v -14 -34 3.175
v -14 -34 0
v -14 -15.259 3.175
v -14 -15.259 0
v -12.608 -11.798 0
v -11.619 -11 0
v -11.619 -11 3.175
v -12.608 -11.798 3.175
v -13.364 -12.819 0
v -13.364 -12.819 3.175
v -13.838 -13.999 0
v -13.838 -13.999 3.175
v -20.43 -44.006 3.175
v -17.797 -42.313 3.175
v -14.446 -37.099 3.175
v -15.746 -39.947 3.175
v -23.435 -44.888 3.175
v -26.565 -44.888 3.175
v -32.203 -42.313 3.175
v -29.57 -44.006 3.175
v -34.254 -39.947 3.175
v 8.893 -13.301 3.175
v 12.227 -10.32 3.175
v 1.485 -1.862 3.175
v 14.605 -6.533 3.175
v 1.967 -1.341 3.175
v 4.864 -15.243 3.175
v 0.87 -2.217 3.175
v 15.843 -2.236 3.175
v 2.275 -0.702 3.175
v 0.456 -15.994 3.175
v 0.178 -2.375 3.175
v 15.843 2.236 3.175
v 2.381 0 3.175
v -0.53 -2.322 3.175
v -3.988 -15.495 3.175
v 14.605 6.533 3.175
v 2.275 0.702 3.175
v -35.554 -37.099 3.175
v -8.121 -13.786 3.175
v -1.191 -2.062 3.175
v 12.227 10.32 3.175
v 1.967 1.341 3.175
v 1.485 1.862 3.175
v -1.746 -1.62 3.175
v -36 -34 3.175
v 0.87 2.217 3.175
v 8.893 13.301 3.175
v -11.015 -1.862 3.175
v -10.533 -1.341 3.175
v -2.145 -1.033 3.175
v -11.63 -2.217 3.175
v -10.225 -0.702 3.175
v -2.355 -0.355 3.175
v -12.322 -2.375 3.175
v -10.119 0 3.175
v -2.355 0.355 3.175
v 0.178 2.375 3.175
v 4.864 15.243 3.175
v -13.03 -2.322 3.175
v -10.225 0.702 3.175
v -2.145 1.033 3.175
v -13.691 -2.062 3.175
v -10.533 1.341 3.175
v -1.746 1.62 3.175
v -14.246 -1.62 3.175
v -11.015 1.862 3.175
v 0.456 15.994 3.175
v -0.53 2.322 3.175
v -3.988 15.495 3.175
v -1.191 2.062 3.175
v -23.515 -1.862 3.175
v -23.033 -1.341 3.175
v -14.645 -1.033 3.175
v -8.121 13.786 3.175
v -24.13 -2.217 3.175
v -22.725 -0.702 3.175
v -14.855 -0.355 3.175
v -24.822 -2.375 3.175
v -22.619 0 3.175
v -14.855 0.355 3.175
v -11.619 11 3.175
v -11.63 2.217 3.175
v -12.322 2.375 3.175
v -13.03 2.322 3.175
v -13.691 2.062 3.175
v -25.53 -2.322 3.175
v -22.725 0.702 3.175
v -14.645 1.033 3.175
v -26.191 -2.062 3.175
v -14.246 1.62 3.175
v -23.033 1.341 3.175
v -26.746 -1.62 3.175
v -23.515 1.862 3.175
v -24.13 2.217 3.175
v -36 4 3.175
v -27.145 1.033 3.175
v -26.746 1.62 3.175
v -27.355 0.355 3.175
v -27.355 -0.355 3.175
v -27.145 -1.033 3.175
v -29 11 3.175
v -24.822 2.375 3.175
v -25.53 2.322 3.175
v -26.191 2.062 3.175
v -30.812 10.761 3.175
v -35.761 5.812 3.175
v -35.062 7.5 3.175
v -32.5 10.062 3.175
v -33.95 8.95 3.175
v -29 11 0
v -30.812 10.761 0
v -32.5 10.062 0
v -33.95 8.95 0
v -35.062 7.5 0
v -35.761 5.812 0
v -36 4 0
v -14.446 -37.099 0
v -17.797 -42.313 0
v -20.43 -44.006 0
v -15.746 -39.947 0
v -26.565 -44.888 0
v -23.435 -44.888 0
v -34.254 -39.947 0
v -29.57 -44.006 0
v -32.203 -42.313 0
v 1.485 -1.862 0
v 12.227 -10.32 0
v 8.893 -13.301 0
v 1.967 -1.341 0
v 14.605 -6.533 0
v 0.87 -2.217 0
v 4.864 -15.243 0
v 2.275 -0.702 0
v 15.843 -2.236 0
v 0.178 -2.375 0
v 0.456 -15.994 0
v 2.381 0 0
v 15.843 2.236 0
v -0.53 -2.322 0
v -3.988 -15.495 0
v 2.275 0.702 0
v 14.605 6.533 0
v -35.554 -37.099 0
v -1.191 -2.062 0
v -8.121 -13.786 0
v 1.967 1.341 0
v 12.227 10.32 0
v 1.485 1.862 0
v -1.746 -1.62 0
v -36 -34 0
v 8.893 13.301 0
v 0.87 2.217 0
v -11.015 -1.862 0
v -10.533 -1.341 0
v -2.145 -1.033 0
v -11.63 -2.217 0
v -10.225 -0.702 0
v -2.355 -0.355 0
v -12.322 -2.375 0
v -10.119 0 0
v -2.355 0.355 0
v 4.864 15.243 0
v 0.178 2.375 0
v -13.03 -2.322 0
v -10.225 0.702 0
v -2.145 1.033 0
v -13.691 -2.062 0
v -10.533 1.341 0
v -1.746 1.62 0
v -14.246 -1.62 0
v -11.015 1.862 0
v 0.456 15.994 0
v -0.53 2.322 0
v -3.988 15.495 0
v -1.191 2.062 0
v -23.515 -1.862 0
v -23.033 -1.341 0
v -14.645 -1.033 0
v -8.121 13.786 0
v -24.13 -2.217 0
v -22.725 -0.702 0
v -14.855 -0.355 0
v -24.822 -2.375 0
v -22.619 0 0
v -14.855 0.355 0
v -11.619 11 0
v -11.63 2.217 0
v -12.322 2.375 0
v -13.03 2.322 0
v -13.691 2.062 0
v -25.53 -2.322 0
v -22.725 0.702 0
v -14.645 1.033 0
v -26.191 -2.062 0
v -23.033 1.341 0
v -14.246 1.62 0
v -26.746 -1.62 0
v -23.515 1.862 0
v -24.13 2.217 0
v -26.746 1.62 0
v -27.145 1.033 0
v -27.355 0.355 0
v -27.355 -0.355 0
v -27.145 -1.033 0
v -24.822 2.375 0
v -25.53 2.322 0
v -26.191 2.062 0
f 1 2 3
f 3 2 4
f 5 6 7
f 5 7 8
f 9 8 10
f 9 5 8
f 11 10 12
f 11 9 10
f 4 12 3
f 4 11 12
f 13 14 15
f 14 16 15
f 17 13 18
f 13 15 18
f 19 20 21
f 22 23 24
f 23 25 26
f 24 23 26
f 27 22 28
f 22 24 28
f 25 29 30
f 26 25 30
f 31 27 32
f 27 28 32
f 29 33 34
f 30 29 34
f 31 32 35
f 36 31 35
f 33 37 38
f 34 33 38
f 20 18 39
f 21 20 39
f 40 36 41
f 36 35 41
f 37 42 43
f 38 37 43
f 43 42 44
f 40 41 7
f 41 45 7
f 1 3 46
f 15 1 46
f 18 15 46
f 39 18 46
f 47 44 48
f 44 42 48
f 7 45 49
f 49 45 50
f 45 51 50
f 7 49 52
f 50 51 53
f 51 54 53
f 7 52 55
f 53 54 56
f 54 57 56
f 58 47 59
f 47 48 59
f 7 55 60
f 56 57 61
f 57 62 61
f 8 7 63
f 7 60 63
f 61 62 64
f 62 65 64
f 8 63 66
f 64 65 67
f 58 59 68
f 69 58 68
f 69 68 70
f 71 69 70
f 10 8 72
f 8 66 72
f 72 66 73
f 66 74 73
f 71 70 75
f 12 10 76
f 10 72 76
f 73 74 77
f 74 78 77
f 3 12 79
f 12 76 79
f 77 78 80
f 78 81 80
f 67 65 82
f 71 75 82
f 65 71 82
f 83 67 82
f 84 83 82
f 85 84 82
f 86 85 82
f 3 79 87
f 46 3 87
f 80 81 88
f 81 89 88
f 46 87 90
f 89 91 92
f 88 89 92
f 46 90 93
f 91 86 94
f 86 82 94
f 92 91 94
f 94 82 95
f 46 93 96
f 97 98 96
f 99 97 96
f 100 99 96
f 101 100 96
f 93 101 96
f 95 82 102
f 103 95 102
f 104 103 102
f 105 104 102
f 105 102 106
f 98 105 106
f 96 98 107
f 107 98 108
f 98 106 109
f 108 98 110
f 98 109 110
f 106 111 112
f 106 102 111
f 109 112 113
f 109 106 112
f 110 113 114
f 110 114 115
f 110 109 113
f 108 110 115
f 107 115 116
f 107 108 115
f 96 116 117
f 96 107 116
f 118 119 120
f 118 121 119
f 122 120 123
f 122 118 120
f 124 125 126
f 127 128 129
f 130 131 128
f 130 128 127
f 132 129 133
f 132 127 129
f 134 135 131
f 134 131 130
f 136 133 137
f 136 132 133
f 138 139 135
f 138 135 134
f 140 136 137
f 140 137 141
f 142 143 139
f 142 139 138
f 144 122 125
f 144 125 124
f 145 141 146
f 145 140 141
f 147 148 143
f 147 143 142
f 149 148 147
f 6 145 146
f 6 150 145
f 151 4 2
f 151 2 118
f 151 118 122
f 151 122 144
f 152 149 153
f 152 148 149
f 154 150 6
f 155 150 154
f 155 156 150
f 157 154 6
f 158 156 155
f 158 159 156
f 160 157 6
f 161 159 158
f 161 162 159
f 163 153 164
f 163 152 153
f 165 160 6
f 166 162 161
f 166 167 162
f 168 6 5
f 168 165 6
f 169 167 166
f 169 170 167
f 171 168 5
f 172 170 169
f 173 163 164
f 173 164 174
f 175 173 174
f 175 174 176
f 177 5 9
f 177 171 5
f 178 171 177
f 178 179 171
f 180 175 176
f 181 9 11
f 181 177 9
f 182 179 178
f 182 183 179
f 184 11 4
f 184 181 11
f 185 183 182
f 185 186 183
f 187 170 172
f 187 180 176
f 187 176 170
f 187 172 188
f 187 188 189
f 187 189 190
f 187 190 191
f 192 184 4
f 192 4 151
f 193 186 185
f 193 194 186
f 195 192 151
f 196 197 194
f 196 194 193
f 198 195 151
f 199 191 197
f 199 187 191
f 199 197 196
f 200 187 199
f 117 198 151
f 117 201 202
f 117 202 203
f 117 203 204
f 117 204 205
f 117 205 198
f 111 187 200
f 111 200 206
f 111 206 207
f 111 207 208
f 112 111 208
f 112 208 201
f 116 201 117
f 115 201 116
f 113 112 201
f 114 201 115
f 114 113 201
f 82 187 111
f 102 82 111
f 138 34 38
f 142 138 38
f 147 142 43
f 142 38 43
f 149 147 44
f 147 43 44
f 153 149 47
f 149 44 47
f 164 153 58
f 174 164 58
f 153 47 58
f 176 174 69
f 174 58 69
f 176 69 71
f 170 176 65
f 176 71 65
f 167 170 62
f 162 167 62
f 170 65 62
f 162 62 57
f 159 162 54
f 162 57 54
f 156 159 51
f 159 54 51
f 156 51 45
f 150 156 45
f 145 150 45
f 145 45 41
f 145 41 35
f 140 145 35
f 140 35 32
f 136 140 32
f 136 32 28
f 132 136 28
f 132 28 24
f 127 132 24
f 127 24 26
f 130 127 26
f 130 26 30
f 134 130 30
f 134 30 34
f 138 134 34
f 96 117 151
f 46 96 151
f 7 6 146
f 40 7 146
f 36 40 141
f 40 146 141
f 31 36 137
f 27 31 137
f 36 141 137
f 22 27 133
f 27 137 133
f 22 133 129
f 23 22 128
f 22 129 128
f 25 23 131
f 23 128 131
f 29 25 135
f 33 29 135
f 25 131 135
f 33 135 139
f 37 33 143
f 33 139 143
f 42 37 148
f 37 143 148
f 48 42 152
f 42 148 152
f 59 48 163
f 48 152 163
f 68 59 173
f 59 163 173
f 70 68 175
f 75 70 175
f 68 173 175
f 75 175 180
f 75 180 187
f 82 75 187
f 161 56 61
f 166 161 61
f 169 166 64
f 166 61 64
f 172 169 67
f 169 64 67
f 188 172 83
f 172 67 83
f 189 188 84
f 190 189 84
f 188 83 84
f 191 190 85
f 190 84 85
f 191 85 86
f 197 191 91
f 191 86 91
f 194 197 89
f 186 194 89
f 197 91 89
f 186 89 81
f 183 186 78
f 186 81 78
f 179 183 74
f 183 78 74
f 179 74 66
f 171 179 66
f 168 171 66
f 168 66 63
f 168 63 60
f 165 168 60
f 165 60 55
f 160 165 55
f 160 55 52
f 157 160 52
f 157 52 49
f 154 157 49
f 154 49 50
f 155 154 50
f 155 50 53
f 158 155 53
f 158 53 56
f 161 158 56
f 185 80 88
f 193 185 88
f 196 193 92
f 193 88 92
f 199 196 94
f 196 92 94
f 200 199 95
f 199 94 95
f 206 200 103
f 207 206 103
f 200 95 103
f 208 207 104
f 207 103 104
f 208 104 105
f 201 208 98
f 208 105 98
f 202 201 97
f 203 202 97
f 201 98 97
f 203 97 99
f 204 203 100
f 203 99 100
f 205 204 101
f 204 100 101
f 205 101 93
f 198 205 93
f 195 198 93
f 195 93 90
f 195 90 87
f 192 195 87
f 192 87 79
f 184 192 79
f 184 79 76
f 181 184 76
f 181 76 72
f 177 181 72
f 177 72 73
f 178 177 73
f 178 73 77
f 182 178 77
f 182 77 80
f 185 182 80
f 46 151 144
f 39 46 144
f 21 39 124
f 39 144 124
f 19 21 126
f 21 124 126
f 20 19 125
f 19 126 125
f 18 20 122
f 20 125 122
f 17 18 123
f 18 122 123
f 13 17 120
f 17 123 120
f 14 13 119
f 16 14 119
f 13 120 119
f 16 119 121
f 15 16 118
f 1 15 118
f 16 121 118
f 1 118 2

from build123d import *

# Parameters (mm, degrees)
BOSS_EXTRUDE1_DEPTH = 3.175
FILLET1_R           = 7
FILLET2_R           = 5
SKETCH2_R           = 2.38125
CUT_EXTRUDE1_DEPTH  = 58.715514595
LPATTERN1_COUNT     = 3
LPATTERN1_PITCH     = 12.5


with BuildPart() as part:
    # Sketch1 → Boss-Extrude1 (new body)
    with BuildSketch(Plane.XY):
        with BuildLine():
            Line((-11.618950039, 11), (-36, 11))
            Line((-36, 11), (-36, -34))
            ThreePointArc((-36, -34), (-25, -45), (-14, -34))
            Line((-14, -34), (-14, -11))
            Line((-14, -11), (-11.618950039, -11))
            ThreePointArc((-11.618950039, -11), (16, 0), (-11.618950039, 11))
        make_face()
    extrude(amount=BOSS_EXTRUDE1_DEPTH)

    # Fillet1
    fillet1_edges = [part.edges().sort_by_distance(p)[0] for p in [
        (-36, 11, 1.5875),
    ]]
    fillet(fillet1_edges, radius=FILLET1_R)

    # Fillet2
    # the kernel refuses this fillet: 5 mm, written as the material it adds along each edge
    with BuildSketch(Plane(origin=(-14, -11, 0), x_dir=(1, 0, 0), z_dir=(0, 0, 1))) as fillet2_piece_1:
        with BuildLine():
            CenterArc((5, -4.259237102), FILLET2_R, 121.586822832, 58.413177168)
            Line((0, -4.259237102), (-0.1, -4.259237102))
            Line((-0.1, -4.259237102), (-0.1, 0))
            Line((-0.1, 0), (0, 0.1))
            ThreePointArc((0, 0.1), (1.190524981, 0.1), (2.328670961, 0.085184742))
            Line((2.328670961, 0.085184742), (2.381049961, 0))
        make_face()
    extrude(amount=3.175)

    # Sketch2 → Cut-Extrude1 (cut, through all)
    with BuildSketch(Plane.XY.offset(3.175)):
        Circle(SKETCH2_R)
    cut_extrude1 = extrude(amount=-CUT_EXTRUDE1_DEPTH, mode=Mode.SUBTRACT)

    # LPattern1: Cut-Extrude1 ×3
    with Locations(*[(-i * LPATTERN1_PITCH, 0, 0) for i in range(1, LPATTERN1_COUNT)]):
        add(cut_extrude1, mode=Mode.SUBTRACT)


solid = part.part
